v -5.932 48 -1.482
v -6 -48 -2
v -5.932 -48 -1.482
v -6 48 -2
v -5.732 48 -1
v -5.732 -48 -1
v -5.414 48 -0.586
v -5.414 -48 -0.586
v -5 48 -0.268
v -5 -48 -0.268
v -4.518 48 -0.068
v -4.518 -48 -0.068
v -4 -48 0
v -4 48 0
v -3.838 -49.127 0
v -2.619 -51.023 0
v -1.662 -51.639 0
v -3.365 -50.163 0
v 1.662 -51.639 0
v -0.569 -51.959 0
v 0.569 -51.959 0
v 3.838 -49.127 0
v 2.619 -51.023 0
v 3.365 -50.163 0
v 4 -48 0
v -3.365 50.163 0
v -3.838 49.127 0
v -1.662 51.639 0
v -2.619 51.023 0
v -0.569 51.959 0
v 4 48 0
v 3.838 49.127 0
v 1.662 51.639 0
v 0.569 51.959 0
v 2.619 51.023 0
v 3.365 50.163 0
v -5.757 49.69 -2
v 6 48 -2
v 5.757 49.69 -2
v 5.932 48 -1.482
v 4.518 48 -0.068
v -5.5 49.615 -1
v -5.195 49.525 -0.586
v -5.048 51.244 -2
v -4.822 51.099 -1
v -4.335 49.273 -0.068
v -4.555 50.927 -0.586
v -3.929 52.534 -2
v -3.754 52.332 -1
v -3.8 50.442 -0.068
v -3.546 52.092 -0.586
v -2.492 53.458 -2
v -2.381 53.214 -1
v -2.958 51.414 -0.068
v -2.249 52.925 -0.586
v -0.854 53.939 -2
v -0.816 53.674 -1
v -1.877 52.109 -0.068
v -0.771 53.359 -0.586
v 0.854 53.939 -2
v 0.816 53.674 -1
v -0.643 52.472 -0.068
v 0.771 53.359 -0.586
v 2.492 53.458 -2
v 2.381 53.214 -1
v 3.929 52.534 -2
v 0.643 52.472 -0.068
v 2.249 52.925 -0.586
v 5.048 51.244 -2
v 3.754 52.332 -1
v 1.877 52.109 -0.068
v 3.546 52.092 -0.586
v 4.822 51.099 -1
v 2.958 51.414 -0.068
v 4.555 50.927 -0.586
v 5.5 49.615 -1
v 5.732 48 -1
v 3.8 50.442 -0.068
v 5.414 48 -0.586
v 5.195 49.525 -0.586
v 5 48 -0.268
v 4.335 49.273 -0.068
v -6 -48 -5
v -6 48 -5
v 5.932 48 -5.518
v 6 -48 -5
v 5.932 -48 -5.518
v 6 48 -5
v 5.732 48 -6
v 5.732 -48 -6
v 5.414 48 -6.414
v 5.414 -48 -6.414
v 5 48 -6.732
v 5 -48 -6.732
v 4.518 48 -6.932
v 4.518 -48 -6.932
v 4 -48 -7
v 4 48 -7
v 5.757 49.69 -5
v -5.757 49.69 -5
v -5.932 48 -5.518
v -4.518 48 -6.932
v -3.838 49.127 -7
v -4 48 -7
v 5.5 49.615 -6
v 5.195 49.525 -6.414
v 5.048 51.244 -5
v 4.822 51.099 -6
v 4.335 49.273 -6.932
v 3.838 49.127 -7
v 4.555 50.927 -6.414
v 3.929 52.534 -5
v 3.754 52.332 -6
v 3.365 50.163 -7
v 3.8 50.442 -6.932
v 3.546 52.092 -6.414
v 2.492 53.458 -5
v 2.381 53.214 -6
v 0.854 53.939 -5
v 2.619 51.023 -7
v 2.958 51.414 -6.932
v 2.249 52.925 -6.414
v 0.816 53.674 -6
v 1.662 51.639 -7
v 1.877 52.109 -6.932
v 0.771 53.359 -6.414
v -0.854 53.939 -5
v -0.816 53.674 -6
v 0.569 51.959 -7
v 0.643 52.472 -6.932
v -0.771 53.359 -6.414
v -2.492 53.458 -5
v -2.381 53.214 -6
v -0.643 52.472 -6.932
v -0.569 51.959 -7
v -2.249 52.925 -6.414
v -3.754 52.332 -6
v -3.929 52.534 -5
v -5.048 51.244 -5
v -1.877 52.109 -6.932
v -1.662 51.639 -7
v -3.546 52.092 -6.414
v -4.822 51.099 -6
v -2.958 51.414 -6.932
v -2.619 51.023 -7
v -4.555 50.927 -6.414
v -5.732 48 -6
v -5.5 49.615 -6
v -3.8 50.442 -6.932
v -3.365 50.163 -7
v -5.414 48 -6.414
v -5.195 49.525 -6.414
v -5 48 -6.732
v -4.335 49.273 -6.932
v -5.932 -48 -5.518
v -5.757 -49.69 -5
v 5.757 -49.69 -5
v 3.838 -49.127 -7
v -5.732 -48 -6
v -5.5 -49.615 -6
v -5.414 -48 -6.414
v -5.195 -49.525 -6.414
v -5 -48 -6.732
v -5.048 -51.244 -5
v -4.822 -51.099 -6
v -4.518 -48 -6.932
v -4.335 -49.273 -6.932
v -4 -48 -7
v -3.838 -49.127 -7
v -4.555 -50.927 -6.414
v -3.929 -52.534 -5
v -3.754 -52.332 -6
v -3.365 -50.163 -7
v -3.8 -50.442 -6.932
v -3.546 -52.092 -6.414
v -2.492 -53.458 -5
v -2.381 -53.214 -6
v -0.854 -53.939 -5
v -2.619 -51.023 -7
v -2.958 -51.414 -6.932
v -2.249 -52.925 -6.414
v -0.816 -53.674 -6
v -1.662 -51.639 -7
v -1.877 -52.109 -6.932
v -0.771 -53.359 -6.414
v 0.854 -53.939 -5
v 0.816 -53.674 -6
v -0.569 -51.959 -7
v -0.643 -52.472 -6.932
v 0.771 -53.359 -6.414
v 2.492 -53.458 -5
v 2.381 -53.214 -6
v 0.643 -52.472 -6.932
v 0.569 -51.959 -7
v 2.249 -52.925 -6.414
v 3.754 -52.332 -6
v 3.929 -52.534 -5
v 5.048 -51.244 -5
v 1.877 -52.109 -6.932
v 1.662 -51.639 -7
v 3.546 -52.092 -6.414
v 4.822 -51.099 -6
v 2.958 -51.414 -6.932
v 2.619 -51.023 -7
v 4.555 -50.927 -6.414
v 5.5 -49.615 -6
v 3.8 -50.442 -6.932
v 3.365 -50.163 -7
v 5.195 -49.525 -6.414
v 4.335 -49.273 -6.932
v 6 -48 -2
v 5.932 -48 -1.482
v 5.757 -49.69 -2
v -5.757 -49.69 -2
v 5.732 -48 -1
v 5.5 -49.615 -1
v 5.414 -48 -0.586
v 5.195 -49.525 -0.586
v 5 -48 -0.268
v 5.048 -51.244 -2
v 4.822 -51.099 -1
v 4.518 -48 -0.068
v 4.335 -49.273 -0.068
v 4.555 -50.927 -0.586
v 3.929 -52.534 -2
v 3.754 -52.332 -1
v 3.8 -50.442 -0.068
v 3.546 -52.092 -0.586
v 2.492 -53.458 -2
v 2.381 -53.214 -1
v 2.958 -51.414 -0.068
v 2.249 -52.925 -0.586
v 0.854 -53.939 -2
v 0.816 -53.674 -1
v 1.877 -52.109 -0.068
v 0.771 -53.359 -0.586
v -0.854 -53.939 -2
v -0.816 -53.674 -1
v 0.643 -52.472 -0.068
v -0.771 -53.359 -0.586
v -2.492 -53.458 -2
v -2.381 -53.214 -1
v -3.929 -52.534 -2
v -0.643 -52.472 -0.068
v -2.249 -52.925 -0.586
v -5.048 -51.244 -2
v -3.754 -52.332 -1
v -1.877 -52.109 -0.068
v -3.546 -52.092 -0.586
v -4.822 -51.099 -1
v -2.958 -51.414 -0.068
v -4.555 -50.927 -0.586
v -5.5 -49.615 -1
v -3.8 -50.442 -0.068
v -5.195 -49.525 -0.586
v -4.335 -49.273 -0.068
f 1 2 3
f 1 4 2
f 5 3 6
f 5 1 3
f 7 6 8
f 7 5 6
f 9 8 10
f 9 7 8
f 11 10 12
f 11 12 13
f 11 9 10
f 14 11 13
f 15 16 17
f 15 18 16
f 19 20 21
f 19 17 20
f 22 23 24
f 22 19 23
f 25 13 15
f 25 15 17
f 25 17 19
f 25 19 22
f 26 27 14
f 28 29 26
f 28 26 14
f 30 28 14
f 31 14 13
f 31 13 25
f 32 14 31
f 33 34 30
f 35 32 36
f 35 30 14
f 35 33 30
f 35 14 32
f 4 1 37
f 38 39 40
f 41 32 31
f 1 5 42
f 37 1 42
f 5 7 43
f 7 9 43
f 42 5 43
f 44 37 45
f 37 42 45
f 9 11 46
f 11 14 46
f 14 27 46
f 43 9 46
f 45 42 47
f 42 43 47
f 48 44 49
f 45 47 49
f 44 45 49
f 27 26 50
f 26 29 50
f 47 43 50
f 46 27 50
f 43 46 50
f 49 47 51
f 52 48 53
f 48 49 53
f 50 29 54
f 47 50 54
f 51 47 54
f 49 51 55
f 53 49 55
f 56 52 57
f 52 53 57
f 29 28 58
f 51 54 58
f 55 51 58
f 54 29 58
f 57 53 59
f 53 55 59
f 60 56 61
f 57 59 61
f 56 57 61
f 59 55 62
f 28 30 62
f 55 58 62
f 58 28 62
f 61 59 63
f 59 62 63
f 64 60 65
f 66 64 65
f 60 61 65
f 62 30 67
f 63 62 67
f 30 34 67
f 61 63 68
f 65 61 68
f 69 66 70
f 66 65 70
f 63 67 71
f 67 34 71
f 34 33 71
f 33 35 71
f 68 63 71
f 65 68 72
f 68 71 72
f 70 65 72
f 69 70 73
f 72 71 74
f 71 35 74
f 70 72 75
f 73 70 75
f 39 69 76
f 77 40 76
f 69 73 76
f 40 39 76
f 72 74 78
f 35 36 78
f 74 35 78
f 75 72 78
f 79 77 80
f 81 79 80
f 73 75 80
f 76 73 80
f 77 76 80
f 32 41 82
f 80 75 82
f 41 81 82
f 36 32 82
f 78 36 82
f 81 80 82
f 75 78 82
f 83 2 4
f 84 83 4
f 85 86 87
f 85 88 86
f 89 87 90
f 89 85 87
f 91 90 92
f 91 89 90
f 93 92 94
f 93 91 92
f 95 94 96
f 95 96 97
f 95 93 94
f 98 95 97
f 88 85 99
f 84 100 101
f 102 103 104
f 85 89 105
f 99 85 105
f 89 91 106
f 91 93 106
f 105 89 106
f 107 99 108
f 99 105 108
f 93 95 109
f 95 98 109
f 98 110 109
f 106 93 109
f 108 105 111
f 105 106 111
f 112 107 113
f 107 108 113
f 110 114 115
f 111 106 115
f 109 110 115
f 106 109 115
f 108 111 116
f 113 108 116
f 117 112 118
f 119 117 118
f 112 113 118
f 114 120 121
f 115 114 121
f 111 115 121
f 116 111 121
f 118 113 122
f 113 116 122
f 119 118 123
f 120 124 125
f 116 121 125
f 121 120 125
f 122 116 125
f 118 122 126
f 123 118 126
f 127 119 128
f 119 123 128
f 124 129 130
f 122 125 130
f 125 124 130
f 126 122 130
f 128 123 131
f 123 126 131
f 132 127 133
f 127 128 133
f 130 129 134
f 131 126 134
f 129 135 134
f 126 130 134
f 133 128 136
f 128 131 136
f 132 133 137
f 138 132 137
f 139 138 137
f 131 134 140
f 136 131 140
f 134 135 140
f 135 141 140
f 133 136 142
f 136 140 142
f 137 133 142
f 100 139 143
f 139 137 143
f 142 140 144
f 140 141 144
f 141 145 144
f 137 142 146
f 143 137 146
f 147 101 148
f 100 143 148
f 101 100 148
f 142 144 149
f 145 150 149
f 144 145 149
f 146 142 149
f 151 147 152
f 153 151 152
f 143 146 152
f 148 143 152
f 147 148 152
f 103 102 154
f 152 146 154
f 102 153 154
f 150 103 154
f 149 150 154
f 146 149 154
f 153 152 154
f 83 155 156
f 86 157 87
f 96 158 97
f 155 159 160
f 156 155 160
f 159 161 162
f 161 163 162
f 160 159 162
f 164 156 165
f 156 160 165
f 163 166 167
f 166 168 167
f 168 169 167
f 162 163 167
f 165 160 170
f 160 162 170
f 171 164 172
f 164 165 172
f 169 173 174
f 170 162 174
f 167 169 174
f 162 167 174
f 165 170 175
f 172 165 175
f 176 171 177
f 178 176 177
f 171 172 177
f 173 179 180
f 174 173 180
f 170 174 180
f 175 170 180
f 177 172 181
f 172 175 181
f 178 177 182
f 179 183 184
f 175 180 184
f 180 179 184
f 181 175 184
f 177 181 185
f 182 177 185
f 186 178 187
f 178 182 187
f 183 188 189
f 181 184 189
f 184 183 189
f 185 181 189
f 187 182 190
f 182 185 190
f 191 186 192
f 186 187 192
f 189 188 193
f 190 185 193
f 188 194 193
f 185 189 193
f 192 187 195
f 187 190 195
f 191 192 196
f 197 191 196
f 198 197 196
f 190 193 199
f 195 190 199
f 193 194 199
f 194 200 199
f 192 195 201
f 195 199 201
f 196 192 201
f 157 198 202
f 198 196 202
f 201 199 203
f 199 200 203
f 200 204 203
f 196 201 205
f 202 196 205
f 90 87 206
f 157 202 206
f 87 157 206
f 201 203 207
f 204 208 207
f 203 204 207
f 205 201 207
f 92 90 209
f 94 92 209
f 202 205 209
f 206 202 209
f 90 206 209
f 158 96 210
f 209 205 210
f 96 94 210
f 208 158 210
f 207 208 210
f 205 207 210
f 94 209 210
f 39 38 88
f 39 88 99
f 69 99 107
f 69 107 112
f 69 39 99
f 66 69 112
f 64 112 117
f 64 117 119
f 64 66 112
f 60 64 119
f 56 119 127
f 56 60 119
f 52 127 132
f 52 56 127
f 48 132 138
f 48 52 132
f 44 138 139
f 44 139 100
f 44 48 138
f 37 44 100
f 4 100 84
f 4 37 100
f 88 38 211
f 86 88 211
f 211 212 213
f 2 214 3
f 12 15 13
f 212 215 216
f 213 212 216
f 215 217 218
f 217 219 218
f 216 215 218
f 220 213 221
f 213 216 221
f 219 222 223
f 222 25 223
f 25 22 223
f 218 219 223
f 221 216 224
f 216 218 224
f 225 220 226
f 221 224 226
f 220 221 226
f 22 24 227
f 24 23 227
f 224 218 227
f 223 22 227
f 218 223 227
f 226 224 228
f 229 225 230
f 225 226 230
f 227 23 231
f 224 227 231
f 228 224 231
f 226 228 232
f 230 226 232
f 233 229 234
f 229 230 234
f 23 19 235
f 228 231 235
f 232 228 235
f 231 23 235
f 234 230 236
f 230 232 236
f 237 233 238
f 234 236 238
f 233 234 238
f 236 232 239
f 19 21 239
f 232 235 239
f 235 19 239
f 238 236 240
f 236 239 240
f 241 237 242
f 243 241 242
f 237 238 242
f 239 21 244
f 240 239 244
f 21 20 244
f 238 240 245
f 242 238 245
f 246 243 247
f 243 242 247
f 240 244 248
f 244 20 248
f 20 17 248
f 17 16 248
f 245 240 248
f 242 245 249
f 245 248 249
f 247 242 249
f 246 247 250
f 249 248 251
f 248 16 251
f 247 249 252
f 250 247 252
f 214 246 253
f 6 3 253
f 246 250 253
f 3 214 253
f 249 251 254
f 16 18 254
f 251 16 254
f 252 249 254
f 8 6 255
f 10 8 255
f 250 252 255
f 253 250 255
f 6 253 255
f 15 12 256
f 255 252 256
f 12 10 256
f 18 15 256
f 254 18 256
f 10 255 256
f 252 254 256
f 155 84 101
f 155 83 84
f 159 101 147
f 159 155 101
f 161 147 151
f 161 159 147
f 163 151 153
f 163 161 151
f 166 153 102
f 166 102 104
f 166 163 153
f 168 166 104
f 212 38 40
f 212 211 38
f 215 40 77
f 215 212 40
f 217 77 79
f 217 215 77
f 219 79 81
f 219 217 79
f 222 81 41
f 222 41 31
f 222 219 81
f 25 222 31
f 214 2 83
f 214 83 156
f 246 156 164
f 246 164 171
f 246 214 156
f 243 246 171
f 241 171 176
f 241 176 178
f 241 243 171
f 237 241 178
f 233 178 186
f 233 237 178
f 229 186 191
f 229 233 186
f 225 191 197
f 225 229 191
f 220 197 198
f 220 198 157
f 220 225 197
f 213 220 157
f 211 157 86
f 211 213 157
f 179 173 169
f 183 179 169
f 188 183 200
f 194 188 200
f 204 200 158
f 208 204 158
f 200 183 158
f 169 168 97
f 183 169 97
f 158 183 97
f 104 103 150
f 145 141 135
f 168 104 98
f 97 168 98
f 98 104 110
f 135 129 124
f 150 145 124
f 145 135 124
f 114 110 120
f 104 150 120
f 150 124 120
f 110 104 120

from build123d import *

# Parameters (mm, degrees)
EXTRUDE_DEPTH = 7
FILLET_R      = 2
FILLET001_R   = 2


with BuildPart() as part:
    # Sketch → Extrude (new body)
    with BuildSketch(Plane.XY):
        with BuildLine():
            ThreePointArc((-6, -48), (0, -54), (6, -48))
            Line((6, 48), (6, -48))
            ThreePointArc((6, 48), (0, 54), (-6, 48))
            Line((-6, -48), (-6, 48))
        make_face()
    extrude(amount=-EXTRUDE_DEPTH)

    # Fillet
    fillet_edges = [part.edges().sort_by_distance(p)[0] for p in [
        (0, -54, -7),
        (6, 0, -7),
        (0, 54, -7),
        (-6, 0, -7),
    ]]
    fillet(fillet_edges, radius=FILLET_R)

    # Fillet001
    fillet001_edges = [part.edges().sort_by_distance(p)[0] for p in [
        (-6, 0, 0),
        (6, 0, 0),
    ]]
    fillet(fillet001_edges, radius=FILLET001_R)


solid = part.part
